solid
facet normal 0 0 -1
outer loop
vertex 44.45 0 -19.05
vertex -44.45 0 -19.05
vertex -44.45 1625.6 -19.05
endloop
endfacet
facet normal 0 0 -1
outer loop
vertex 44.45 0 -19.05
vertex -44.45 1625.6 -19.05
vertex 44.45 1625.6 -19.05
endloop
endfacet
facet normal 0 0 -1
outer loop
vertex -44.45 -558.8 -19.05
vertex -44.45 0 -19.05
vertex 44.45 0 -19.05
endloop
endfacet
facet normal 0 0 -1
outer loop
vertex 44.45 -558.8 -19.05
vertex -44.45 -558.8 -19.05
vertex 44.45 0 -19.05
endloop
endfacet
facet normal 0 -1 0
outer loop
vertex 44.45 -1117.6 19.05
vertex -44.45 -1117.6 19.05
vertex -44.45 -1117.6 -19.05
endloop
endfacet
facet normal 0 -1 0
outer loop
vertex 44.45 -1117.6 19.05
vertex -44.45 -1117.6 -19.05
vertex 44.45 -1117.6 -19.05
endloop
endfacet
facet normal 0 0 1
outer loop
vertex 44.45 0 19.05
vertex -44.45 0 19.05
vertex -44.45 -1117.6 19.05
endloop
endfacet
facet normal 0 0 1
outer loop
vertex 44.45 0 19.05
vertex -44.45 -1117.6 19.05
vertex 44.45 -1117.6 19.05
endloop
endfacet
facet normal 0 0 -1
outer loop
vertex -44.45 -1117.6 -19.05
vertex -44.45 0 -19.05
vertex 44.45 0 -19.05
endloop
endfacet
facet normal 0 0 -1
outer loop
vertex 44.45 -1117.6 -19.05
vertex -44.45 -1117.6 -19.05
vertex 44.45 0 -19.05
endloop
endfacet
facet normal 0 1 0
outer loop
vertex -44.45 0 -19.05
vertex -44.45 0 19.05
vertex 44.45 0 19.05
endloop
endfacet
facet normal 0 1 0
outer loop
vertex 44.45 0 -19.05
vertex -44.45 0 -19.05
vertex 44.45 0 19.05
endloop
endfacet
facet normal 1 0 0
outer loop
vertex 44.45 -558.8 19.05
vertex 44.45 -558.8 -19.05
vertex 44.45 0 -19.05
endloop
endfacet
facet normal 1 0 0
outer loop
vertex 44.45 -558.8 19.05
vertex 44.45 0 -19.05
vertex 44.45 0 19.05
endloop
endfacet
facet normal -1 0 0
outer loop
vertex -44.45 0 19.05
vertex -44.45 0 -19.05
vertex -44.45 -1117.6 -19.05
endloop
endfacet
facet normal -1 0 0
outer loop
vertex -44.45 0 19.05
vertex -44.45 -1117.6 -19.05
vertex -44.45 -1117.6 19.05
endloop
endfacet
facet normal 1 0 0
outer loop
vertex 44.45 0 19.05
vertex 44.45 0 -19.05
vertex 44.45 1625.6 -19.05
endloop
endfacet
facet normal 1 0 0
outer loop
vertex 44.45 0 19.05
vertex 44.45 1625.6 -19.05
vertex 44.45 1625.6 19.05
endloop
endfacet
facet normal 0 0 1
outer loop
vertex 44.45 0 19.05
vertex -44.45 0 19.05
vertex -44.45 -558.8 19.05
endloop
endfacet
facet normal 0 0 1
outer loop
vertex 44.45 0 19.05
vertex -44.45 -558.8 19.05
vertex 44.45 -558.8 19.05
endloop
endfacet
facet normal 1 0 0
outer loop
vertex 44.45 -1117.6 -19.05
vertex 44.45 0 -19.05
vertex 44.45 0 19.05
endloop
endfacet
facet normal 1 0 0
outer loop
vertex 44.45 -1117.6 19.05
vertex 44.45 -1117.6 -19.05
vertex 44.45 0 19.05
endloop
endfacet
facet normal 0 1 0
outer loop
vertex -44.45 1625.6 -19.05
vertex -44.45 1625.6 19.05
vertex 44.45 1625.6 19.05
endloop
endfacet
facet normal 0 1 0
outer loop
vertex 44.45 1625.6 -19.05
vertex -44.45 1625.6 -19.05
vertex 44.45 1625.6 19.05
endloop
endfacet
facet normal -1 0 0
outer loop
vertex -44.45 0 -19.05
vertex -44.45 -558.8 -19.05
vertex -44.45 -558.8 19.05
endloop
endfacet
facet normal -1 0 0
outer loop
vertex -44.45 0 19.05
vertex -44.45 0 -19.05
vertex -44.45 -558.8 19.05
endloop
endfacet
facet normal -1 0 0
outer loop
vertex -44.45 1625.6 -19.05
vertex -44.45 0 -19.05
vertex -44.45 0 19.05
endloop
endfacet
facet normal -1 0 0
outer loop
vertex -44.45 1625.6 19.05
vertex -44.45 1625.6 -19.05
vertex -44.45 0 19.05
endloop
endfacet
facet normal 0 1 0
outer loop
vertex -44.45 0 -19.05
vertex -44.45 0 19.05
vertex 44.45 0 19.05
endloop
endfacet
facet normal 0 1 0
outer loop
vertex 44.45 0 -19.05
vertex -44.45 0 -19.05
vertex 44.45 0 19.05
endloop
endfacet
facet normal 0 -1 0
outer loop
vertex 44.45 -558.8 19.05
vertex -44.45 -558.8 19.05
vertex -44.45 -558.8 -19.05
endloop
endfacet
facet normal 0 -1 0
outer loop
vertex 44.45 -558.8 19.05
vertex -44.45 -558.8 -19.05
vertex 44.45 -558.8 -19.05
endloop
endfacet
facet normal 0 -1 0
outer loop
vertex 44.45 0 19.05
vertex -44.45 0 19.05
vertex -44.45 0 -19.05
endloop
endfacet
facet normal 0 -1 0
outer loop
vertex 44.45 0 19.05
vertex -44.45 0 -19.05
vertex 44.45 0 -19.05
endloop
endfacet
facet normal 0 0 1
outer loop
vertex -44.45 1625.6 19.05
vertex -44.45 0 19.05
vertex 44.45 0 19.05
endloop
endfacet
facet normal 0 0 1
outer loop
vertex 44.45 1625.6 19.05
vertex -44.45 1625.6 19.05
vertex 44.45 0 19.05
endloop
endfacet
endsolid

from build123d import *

# Parameters (mm, degrees)
F0_W     = 88.9
F0_H     = 38.1
F1_DEPTH = 1625.6
F2_DEPTH = 1117.6
F3_DEPTH = 558.8


with BuildPart() as f1:
    # F0 (on Front) → F1 (new body)
    with BuildSketch(Plane.XZ):
        Rectangle(F0_W, F0_H)
    extrude(amount=-F1_DEPTH)


with BuildPart() as f2:
    # F0 (on Front) → F2 (new body)
    with BuildSketch(Plane.XZ):
        Rectangle(F0_W, F0_H)
    extrude(amount=F2_DEPTH)


with BuildPart() as f3:
    # F0 (on Front) → F3 (new body)
    with BuildSketch(Plane.XZ):
        Rectangle(F0_W, F0_H)
    extrude(amount=F3_DEPTH)


solid = Compound([f1.part, f2.part, f3.part])
